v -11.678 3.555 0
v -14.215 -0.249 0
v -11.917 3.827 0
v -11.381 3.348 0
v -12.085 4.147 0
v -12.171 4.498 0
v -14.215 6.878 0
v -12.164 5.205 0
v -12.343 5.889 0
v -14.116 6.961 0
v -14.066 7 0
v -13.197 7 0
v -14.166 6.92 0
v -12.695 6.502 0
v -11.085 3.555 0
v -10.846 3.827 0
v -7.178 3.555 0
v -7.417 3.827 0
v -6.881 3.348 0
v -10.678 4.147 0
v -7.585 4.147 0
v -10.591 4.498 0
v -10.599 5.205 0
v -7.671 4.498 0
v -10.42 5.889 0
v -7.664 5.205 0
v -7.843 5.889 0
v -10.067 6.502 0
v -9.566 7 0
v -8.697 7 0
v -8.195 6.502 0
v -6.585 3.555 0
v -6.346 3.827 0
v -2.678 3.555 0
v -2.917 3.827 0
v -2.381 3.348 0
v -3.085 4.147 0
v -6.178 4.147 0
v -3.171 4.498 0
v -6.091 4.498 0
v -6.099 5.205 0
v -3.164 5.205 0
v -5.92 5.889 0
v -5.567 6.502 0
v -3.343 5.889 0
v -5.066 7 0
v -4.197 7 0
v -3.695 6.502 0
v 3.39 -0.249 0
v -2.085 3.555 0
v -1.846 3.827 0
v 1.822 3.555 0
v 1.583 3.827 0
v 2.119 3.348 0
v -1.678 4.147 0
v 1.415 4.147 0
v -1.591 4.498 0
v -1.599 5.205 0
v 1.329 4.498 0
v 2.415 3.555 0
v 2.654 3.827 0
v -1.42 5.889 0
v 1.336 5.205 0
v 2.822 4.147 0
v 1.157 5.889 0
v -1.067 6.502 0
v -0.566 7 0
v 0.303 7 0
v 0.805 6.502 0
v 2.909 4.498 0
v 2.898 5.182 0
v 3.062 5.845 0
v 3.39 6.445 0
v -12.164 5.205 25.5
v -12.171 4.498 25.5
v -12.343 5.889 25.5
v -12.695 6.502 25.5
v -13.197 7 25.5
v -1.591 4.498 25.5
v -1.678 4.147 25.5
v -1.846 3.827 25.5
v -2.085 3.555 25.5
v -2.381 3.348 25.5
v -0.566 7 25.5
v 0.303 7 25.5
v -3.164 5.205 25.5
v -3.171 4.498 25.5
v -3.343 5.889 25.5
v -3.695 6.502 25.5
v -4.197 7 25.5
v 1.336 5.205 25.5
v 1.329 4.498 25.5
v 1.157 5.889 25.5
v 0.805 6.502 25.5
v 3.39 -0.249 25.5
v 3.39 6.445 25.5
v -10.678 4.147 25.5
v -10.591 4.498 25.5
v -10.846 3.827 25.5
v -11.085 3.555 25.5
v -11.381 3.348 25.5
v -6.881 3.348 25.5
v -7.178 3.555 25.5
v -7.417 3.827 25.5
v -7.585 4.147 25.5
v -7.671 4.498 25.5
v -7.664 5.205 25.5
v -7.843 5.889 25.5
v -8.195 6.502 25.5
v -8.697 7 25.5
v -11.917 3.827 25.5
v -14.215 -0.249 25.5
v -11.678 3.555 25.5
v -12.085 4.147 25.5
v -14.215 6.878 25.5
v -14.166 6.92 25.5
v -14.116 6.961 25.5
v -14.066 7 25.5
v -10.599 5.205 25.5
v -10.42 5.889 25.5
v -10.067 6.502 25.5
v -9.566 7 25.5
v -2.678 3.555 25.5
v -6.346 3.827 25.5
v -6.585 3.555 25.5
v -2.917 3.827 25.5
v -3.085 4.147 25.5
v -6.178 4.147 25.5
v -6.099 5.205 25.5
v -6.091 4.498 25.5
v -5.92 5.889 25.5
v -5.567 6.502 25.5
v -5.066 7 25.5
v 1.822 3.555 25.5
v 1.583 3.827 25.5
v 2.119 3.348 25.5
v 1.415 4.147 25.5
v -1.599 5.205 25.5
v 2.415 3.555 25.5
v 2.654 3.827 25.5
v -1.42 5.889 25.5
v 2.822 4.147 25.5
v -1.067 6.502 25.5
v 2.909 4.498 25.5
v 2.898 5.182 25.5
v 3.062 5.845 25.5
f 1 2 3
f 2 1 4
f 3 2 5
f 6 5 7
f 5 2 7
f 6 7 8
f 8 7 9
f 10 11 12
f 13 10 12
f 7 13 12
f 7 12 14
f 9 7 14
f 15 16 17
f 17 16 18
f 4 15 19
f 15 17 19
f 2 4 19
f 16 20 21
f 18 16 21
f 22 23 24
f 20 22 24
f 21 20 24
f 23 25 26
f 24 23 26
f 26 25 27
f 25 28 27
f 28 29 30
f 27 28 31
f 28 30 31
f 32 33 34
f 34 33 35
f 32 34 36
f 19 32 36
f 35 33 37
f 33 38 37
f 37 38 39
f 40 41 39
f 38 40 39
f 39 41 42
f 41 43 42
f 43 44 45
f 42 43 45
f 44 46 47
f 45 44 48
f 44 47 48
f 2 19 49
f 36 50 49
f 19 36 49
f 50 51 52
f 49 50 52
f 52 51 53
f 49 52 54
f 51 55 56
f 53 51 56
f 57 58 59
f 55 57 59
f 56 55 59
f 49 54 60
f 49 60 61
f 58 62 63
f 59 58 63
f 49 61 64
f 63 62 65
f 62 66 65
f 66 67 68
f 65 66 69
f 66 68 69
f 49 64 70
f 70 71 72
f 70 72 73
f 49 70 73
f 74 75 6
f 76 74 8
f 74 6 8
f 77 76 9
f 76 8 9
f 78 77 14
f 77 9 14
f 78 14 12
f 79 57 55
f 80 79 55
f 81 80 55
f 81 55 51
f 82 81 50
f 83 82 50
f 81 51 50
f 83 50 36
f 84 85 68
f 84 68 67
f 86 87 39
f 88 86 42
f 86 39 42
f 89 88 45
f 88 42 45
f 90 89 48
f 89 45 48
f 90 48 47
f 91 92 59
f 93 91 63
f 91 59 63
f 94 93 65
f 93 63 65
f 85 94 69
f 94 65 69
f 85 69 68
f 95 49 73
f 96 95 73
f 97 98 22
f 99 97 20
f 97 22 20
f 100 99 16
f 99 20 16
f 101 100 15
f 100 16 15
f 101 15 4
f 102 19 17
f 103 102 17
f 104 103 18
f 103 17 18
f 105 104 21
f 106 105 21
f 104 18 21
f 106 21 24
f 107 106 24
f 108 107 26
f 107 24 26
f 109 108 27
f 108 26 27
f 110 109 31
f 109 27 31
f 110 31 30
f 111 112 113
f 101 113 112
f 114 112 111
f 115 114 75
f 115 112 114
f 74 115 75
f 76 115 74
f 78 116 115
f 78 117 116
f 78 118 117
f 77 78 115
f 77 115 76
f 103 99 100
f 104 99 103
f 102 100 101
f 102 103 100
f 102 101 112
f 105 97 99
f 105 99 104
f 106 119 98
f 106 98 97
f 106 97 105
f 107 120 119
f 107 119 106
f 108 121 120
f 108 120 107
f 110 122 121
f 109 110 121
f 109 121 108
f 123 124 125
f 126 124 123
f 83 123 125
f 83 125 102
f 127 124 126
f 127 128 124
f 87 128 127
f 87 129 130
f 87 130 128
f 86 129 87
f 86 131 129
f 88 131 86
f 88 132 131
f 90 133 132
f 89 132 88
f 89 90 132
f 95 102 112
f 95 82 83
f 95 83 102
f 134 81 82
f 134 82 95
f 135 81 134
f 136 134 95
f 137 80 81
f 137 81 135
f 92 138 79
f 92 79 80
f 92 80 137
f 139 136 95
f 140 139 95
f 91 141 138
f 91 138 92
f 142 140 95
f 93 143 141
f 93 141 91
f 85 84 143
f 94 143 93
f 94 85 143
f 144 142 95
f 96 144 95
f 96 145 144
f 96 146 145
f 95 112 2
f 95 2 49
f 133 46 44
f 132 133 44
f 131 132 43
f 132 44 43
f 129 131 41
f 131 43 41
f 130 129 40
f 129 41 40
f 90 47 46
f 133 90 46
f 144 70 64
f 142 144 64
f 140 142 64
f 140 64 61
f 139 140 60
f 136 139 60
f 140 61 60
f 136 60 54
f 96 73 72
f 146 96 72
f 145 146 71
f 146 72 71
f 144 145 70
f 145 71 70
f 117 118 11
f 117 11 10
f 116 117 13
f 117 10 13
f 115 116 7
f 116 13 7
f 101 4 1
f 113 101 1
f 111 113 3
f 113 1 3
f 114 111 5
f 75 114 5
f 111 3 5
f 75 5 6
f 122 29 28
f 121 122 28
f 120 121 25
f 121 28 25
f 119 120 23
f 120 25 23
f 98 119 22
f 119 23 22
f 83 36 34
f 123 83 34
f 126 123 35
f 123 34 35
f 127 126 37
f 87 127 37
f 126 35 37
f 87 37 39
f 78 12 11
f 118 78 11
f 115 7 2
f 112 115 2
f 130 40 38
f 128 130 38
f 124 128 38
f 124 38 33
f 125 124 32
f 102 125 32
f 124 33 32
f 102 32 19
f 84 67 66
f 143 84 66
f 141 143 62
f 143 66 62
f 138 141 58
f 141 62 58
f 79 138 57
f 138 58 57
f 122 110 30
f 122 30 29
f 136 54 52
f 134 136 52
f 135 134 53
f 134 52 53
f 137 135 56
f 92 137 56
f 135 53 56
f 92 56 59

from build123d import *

# Parameters (mm, degrees)
BOSS_EXTRUDE1_DEPTH  = 25.5
CUT_EXTRUDE1_DEPTH   = 26.12
LPATTERN1_COUNT      = 4
LPATTERN1_PITCH      = 4.5
LPATTERN1_COUNT_DIR2 = 9
LPATTERN1_PITCH_DIR2 = 4.5


with BuildPart() as part:
    # Sketch1 → Boss-Extrude1 (new body)
    with BuildSketch(Plane.XY):
        Polygon((-14.215030011, 7), (-14.215030011, -0.249149017), (0.939234275, -0.249149017), (3.390192413, -0.249149017), (3.390192413, 7), align=None)
    extrude(amount=BOSS_EXTRUDE1_DEPTH)

    # Sketch2 → Cut-Extrude1 (cut)
    with BuildSketch(Plane.XY):
        with BuildLine():
            ThreePointArc((-6.881285782, 3.348371163), (-7.417069895, 3.826658598), (-7.671285782, 4.498371163))
            ThreePointArc((-7.671285782, 4.498371163), (-7.912320341, 6.04482582), (-8.981285782, 7.188037328))
            ThreePointArc((-8.981285782, 7.188037328), (-6.881285782, 7.762283268), (-4.781285782, 7.188037328))
            ThreePointArc((-4.781285782, 7.188037328), (-5.850251222, 6.04482582), (-6.091285782, 4.498371163))
            ThreePointArc((-6.091285782, 4.498371163), (-6.345501668, 3.826658598), (-6.881285782, 3.348371163))
        make_face()
    cut_extrude1 = extrude(amount=CUT_EXTRUDE1_DEPTH, mode=Mode.SUBTRACT)

    # LPattern1: Cut-Extrude1 4 × 9
    with Locations(*[Vector(-1, 0, 0) * (i * LPATTERN1_PITCH) + Vector(1, 0, 0) * (j * LPATTERN1_PITCH_DIR2) for i in range(LPATTERN1_COUNT) for j in range(LPATTERN1_COUNT_DIR2) if (i, j) != (0, 0)]):
        add(cut_extrude1, mode=Mode.SUBTRACT)


solid = part.part
